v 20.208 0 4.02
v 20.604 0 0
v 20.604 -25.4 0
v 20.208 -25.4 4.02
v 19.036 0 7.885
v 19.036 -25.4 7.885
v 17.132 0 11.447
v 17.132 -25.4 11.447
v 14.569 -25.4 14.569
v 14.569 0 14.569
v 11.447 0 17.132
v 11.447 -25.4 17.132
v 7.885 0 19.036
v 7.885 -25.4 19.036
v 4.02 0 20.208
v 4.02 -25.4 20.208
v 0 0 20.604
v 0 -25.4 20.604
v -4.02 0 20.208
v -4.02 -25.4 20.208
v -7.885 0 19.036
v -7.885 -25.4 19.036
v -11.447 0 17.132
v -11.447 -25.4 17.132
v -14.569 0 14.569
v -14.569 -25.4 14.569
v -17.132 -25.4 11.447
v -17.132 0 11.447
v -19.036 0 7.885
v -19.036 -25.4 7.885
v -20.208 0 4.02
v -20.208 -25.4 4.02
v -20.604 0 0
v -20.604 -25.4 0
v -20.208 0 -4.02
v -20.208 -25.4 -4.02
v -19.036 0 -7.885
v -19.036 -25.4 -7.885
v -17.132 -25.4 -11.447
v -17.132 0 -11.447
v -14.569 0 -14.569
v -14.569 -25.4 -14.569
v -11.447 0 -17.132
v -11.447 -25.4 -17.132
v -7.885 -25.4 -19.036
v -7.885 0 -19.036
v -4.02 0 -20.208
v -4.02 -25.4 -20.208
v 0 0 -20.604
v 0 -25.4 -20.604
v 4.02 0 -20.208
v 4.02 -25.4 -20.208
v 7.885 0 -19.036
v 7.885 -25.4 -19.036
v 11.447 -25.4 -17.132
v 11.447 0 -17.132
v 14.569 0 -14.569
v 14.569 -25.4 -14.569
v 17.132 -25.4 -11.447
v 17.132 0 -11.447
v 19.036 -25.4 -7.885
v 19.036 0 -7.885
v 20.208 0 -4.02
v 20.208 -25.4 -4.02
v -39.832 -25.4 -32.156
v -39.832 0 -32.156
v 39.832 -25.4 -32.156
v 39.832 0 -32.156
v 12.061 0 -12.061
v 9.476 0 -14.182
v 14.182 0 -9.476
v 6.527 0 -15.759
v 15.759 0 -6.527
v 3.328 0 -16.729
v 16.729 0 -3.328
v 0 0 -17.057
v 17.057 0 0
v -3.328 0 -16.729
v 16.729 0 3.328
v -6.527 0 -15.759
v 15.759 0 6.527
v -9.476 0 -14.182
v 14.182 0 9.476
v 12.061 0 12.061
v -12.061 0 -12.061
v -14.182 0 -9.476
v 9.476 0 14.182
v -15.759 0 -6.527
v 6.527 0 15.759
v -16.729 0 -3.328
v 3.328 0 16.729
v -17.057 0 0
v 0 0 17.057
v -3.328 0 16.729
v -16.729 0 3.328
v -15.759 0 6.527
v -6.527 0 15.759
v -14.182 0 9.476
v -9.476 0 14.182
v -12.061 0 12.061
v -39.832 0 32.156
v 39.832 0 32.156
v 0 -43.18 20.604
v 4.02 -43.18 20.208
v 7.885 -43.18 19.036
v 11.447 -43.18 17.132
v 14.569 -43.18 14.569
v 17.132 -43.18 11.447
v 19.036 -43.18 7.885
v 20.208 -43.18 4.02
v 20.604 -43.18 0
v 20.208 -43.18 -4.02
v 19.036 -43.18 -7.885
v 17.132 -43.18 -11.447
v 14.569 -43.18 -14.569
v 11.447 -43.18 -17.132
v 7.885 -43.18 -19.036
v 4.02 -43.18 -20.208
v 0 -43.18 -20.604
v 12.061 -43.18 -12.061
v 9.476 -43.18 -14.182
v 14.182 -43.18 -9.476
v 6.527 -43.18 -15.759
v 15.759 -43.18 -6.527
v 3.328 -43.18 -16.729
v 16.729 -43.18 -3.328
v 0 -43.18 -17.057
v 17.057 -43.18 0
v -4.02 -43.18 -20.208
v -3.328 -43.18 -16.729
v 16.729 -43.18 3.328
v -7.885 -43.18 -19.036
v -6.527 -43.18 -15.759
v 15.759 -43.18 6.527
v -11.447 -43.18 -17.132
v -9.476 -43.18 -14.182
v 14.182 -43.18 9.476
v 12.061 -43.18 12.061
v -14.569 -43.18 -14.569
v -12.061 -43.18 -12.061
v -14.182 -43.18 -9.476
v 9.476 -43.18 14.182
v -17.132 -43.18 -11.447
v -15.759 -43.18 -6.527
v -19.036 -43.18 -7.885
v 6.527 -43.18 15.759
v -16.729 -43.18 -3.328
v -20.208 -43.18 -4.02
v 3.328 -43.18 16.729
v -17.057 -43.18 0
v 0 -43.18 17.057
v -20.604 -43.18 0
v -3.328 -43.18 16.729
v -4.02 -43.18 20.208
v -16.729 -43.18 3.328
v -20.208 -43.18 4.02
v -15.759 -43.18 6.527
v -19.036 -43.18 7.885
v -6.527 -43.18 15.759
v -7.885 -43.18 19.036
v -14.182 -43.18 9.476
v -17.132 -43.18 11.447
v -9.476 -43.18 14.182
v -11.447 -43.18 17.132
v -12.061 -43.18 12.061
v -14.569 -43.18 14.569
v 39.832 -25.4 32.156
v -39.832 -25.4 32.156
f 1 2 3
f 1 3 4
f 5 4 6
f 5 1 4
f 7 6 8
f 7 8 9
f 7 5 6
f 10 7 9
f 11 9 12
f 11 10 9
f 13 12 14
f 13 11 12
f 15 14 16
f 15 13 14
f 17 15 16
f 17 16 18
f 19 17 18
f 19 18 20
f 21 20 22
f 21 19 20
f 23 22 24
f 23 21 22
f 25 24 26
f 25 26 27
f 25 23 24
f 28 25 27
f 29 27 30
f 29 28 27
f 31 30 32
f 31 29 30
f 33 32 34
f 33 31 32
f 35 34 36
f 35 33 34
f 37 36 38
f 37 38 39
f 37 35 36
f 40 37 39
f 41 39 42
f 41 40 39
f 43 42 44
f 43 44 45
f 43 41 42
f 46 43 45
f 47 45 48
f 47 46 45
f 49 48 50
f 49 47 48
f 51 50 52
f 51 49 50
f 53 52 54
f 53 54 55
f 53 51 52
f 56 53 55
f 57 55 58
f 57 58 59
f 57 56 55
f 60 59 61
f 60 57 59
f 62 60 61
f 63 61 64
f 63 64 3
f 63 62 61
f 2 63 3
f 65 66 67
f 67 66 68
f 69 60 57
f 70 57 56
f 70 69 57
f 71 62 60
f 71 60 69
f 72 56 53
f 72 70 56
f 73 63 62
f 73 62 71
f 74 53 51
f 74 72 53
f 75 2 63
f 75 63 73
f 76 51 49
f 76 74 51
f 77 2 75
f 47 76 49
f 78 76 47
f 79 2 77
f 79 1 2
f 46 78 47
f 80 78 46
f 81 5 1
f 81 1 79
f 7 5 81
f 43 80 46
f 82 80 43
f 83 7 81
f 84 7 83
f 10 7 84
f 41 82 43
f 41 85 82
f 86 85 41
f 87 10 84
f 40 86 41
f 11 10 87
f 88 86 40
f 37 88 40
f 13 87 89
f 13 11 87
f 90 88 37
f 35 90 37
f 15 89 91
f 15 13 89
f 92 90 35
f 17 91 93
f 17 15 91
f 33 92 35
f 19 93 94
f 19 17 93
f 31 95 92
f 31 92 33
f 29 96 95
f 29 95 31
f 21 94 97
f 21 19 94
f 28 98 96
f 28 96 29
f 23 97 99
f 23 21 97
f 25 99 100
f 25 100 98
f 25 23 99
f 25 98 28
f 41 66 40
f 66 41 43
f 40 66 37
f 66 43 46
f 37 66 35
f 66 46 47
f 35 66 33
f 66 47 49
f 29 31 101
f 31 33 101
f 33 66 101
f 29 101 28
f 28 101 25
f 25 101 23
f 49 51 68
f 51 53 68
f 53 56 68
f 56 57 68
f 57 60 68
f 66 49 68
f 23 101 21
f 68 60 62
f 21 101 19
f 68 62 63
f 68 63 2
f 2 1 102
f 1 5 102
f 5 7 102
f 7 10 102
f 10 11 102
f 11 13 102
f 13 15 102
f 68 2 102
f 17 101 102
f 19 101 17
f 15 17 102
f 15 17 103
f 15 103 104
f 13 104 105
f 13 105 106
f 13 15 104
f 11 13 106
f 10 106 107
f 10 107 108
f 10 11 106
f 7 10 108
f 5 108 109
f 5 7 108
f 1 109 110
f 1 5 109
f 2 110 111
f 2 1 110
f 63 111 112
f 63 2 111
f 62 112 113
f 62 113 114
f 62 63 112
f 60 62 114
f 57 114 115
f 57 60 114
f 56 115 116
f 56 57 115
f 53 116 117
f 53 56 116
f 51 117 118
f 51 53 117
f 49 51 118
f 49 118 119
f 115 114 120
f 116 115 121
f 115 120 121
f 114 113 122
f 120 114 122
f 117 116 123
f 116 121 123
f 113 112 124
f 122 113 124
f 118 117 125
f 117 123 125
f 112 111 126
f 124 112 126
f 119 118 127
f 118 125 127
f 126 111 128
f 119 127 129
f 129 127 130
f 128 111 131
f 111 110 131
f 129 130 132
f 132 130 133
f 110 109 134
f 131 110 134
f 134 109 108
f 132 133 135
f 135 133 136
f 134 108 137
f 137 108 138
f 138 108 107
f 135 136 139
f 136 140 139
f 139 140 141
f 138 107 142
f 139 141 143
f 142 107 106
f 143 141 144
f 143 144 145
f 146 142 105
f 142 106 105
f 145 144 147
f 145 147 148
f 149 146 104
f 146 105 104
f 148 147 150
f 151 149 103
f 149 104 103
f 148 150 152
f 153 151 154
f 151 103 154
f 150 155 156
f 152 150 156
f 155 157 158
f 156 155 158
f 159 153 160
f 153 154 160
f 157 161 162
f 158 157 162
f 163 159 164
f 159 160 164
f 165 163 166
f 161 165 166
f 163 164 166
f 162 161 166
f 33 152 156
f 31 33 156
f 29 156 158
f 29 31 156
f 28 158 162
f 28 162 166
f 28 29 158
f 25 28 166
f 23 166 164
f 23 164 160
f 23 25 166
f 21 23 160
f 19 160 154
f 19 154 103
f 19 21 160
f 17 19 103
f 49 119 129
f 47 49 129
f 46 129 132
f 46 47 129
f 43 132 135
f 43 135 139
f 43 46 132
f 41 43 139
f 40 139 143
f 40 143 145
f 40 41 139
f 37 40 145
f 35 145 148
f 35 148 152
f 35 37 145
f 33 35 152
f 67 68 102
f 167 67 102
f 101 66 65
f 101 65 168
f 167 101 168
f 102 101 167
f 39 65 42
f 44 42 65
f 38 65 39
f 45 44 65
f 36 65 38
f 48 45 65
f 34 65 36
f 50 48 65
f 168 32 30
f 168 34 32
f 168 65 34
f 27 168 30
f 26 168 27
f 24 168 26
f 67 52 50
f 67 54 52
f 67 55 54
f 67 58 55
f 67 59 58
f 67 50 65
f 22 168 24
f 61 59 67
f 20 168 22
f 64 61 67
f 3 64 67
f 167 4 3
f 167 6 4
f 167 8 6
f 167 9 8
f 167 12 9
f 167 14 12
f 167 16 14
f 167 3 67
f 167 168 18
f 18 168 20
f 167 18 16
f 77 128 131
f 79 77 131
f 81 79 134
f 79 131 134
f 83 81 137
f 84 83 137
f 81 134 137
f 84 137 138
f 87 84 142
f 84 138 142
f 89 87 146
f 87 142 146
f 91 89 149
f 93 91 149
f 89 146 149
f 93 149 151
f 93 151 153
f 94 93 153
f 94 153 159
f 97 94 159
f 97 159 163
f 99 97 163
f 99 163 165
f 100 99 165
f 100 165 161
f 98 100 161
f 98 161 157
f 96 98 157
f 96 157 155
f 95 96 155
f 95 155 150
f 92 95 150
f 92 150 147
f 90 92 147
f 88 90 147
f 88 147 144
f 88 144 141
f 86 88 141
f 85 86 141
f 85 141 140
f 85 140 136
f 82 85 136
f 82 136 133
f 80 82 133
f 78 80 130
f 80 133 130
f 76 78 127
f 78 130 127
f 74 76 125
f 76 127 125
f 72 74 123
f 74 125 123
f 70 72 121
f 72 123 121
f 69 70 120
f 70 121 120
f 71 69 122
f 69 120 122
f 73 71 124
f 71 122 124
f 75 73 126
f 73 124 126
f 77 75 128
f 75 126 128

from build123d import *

# Parameters (mm, degrees)
F0_W     = 79.6634554863
F0_H     = 64.3117427826
F0_R     = 20.6041591681
F1_DEPTH = 25.4
F3_DEPTH = 43.18
F4_R     = 17.0569002262
F5_DEPTH = 50.8


with BuildPart() as f1:
    # F0 (on Front) → F1 (new body)
    with BuildSketch(Plane.XZ):
        Rectangle(F0_W, F0_H)
        Circle(F0_R, mode=Mode.SUBTRACT)
    extrude(amount=F1_DEPTH)


with BuildPart() as f3:
    # F2 (on face) → F3 (new body)
    with BuildSketch(Plane(origin=(0, 0, 0), x_dir=(-1, 0, 0), z_dir=(0, 1, 0))):
        with BuildLine():
            ThreePointArc((0, -20.6041591681), (14.5693406684, -14.5693406684), (20.6041591681, 0))
            ThreePointArc((20.6041591681, 0), (14.5693406684, 14.5693406684), (0, 20.6041591681))
            ThreePointArc((0, 20.6041591681), (-20.6041591681, 0), (0, -20.6041591681))
        make_face()
    extrude(amount=-F3_DEPTH)

    # F4 (on face) → F5 (cut)
    with BuildSketch(Plane.XZ.offset(43.18)):
        Circle(F4_R)
    extrude(amount=-F5_DEPTH, mode=Mode.SUBTRACT)


solid = Compound([f1.part, f3.part])
